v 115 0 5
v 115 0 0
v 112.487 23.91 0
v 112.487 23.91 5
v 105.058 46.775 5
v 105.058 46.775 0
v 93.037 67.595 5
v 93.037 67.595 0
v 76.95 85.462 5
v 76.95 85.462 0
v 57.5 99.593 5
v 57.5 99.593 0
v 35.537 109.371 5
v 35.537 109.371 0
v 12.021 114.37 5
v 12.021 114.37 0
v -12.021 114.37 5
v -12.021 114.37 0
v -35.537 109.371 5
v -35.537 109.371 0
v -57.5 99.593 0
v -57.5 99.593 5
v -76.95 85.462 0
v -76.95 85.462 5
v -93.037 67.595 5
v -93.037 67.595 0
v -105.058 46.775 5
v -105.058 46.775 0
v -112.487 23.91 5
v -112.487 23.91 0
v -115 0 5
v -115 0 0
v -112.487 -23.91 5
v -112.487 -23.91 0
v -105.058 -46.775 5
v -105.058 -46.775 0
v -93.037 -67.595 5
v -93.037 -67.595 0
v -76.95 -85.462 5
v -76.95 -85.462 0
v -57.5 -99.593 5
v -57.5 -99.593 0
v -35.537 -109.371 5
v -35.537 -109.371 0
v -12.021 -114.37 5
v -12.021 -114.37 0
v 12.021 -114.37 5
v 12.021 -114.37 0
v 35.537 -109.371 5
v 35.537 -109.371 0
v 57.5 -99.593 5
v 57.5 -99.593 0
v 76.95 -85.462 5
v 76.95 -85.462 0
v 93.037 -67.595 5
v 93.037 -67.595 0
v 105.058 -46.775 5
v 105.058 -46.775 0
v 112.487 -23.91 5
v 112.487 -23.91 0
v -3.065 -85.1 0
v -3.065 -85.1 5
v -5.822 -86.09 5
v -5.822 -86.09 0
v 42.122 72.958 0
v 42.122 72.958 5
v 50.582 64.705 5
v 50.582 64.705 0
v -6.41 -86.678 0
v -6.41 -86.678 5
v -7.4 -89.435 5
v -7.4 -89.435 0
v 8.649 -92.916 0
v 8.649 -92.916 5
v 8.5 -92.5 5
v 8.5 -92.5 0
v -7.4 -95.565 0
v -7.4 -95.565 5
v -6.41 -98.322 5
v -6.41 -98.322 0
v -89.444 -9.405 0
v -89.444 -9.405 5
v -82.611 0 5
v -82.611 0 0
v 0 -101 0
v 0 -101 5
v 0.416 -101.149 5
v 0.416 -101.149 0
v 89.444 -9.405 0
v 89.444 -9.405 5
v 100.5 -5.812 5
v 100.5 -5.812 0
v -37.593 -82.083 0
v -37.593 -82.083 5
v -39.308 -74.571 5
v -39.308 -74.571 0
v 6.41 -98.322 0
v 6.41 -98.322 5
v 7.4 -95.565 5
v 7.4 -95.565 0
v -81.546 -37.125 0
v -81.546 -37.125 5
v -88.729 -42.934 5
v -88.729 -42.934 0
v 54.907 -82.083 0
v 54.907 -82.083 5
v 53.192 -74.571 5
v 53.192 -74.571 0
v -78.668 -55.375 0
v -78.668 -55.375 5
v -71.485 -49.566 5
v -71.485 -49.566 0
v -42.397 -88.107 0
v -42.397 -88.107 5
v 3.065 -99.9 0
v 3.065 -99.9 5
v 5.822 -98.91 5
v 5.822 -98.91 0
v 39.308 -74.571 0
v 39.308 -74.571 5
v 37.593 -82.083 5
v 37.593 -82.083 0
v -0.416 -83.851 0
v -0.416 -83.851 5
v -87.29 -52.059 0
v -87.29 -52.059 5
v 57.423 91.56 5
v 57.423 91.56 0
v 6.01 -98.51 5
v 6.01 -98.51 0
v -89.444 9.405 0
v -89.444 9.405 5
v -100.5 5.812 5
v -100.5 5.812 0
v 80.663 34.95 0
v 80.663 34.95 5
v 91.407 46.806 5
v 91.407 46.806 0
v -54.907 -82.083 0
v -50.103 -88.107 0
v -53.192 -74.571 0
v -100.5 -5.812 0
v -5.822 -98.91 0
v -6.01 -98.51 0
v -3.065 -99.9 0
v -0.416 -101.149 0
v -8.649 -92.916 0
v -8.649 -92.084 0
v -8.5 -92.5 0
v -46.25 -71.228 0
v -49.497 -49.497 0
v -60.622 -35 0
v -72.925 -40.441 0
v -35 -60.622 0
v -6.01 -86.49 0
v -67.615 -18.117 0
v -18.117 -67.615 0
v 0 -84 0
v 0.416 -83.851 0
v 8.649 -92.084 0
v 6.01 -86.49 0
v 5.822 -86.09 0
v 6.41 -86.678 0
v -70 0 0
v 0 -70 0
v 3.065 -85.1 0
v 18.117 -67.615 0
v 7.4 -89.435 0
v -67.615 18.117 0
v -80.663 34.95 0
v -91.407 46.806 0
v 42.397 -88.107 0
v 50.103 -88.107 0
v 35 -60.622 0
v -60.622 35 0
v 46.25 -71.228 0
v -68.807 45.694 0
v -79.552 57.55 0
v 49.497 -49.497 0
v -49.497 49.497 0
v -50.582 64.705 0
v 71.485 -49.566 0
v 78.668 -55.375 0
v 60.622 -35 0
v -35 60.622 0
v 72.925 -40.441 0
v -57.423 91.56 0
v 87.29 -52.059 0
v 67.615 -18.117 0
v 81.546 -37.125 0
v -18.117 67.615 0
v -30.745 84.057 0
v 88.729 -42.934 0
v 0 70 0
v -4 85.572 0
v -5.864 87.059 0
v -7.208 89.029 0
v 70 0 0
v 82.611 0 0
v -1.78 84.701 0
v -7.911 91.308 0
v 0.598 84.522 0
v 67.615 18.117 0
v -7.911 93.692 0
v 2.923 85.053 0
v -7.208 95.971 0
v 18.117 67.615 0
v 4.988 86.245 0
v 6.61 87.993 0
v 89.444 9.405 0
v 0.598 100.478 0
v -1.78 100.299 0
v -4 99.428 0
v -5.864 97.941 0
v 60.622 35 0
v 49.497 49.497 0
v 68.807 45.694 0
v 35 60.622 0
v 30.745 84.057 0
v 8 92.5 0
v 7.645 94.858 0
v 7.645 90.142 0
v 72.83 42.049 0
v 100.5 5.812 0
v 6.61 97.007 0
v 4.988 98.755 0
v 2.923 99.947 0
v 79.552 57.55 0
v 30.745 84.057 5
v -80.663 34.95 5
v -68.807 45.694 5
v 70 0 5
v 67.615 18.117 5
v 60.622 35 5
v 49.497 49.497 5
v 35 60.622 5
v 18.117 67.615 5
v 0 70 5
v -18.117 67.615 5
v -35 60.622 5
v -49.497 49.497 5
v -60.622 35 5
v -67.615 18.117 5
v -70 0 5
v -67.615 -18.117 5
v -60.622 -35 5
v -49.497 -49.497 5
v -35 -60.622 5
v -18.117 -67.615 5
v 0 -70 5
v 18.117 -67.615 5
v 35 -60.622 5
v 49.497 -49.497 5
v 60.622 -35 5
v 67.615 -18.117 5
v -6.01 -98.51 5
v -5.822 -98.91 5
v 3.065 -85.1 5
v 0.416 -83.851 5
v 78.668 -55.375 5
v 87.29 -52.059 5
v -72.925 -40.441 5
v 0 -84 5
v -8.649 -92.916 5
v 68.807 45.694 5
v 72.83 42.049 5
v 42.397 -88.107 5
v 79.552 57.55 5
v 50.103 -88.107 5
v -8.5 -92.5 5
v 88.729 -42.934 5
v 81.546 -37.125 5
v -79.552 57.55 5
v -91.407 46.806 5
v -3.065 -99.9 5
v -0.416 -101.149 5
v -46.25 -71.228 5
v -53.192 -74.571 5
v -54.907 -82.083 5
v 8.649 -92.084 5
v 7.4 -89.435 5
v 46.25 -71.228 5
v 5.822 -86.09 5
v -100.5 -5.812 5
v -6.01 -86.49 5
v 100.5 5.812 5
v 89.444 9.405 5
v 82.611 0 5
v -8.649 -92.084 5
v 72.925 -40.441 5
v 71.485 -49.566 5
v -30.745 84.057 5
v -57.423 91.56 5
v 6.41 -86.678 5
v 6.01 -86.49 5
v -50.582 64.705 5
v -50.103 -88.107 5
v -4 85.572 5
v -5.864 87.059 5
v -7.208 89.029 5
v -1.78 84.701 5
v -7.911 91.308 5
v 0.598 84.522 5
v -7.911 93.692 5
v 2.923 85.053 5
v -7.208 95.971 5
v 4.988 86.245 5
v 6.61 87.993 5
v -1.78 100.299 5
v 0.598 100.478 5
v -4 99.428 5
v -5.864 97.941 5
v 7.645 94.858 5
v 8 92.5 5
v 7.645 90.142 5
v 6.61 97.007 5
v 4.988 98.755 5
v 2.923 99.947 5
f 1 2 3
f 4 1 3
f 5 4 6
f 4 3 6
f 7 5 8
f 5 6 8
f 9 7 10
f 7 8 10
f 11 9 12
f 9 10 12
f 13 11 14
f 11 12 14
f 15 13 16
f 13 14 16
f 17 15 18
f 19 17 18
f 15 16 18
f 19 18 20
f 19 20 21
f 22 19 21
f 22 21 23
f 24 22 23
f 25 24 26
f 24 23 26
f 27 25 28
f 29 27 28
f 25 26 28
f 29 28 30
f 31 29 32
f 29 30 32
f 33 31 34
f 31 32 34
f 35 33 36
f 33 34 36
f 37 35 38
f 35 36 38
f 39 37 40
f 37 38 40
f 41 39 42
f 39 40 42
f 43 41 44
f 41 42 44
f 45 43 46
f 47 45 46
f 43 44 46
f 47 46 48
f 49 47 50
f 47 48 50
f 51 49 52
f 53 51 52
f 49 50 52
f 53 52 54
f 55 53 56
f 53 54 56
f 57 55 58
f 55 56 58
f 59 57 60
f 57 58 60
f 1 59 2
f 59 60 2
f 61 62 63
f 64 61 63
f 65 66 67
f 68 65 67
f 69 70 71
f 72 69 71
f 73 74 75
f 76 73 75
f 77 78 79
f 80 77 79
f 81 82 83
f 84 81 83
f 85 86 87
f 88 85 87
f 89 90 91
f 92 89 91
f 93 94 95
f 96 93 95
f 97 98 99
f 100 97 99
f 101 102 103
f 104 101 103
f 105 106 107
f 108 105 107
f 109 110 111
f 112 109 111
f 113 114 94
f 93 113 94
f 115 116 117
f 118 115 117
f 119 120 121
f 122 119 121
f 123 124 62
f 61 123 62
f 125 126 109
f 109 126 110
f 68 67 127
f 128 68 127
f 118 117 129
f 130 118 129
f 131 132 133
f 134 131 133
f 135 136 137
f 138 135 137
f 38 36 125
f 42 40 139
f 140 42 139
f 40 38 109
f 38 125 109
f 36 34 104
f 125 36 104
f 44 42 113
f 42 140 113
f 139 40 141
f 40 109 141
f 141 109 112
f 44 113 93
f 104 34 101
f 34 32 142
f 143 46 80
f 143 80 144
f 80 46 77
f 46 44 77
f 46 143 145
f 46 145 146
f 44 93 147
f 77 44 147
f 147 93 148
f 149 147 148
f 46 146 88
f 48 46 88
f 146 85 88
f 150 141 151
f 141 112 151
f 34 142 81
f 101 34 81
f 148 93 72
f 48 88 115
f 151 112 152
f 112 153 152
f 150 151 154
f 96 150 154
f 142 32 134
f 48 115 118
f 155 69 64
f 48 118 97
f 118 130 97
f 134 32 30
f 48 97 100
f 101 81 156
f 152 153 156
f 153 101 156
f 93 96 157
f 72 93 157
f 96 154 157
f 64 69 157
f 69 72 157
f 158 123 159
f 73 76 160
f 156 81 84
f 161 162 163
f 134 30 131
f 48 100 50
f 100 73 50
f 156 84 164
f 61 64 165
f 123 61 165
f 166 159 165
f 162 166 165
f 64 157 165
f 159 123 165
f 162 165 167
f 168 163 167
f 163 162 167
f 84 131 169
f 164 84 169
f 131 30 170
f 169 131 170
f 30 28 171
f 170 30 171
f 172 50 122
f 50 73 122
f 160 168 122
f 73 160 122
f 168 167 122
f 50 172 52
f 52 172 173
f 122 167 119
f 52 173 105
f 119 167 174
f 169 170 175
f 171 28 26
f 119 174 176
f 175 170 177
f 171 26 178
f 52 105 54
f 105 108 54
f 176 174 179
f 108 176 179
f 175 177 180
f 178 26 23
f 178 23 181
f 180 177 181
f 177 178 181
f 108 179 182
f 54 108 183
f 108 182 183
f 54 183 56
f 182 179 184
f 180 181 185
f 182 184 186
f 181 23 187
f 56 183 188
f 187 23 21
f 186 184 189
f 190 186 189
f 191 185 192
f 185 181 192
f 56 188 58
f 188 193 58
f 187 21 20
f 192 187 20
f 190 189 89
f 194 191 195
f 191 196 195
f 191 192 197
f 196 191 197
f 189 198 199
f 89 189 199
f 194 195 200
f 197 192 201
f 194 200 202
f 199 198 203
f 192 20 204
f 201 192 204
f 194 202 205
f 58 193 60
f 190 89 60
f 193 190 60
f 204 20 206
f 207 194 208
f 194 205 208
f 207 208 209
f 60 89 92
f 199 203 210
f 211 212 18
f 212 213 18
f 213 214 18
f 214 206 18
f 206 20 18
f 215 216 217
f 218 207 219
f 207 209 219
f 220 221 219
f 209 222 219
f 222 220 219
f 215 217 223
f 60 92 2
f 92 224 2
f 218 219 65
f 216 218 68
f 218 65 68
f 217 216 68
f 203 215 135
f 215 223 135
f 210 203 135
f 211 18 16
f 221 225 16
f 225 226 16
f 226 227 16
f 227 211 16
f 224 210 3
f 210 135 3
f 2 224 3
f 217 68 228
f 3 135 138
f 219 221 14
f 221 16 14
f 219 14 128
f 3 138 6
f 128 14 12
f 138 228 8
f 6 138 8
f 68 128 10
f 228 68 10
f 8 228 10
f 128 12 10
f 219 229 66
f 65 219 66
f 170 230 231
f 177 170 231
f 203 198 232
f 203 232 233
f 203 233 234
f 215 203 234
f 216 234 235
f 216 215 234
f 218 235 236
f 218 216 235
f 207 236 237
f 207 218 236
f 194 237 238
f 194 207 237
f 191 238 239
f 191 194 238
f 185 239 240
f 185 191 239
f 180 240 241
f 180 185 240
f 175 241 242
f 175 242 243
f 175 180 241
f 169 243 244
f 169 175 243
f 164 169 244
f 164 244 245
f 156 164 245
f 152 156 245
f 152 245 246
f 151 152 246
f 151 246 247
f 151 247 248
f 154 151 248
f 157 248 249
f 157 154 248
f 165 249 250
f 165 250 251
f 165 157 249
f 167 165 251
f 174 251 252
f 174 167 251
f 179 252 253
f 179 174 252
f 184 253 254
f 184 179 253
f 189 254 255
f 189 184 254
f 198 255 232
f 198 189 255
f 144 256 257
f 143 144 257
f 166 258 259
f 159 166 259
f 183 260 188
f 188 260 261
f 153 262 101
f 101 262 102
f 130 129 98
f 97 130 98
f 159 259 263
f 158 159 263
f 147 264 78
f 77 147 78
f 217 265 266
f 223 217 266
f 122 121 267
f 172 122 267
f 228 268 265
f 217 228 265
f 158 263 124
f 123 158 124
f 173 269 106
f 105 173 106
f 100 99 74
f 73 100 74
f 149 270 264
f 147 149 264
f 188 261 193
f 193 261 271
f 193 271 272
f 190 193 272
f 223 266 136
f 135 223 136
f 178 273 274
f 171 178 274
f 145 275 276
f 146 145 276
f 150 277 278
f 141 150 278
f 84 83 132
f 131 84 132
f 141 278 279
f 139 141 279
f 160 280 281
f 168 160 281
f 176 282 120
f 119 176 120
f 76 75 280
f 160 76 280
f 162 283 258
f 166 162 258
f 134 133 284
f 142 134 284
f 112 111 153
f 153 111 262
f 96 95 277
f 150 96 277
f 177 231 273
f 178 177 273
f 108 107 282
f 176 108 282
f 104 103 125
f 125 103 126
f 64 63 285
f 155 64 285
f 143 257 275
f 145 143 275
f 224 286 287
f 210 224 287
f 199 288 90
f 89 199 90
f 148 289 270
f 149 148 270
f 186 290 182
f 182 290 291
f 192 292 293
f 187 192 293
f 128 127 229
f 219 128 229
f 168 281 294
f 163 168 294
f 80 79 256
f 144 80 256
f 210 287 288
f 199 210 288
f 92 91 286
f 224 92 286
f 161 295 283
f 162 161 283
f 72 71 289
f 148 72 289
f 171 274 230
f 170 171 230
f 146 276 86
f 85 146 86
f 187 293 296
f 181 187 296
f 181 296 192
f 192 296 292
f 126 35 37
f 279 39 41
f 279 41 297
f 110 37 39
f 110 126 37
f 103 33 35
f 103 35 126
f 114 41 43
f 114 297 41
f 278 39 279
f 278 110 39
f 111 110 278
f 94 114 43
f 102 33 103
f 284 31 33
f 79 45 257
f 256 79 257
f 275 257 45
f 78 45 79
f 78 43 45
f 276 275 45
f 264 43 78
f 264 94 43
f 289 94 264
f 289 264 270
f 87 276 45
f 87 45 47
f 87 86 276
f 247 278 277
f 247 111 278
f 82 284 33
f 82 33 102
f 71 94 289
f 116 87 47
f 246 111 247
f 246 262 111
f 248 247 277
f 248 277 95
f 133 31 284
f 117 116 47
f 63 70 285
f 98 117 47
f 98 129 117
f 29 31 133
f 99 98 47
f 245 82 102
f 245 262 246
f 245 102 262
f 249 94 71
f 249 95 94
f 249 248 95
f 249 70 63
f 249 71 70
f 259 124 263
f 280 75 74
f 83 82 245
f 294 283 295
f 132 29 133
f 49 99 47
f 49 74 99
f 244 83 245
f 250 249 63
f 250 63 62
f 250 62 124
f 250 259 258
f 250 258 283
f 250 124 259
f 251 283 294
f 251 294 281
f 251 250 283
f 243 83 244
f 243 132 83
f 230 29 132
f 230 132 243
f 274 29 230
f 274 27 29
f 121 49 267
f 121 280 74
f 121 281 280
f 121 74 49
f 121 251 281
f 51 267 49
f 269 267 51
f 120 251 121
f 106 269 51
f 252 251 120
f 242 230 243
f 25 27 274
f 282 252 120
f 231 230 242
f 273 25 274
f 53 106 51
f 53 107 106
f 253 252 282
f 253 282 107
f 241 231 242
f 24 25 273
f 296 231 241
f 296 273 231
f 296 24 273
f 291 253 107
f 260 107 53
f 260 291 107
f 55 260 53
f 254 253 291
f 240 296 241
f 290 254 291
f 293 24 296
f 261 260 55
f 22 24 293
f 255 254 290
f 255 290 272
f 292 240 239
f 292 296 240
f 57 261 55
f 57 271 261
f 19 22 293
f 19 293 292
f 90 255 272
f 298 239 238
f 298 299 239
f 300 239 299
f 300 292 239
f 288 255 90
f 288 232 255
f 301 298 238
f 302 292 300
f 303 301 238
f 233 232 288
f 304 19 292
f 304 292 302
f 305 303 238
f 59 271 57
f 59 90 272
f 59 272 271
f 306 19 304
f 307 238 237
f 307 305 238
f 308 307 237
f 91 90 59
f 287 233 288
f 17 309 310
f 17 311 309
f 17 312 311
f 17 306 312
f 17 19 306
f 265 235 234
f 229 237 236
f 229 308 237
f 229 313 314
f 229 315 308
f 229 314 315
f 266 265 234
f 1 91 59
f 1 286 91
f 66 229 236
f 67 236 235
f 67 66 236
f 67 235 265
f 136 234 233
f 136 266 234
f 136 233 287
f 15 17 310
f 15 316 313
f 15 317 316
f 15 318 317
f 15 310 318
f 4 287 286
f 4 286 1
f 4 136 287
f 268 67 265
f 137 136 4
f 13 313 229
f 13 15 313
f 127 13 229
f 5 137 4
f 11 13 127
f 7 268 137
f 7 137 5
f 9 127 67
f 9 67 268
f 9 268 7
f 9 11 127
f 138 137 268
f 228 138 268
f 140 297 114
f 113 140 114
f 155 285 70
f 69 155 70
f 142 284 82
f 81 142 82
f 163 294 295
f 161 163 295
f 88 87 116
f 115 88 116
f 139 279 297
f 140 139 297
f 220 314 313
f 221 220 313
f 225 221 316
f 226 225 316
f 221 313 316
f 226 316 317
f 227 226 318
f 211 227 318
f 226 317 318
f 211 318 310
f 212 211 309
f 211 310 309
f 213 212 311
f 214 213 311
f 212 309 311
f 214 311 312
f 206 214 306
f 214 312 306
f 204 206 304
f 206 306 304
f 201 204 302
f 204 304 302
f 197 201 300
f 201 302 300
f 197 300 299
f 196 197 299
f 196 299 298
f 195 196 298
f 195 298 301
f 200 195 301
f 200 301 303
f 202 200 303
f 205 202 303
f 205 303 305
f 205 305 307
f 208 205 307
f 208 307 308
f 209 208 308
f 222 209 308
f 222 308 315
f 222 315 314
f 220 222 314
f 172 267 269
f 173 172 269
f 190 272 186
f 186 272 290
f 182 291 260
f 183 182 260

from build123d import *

# Parameters (mm, degrees)
F0_R     = 115
F0_R_2   = 70
F1_DEPTH = 5
F2_R     = 8
F3_DEPTH = 25


with BuildPart() as f1:
    # F0 (on Top) → F1 (new body)
    with BuildSketch(Plane.XY):
        Circle(F0_R)
        Circle(F0_R_2, mode=Mode.SUBTRACT)
    extrude(amount=F1_DEPTH)

    # F2 (on face) → F3 (cut)
    with BuildSketch(Plane.XY.offset(5)):
        with Locations((0, 92.5)):
            Circle(F2_R)
        Polygon((30.7451541874, 84.0570025344), (42.1222582105, 72.9578913502), (50.5819233456, 64.7049331524), (57.422922467, 91.5601138634), align=None)
        Polygon((68.8072985361, 45.6942659799), (72.8301810847, 42.0485246544), (80.6630838702, 34.949948686), (91.4074011641, 46.8057340201), (79.55161583, 57.550051314), align=None)
        Polygon((100.5, -5.812340224), (100.5, 5.812340224), (89.44427191, 9.4045640367), (82.61145618, 0), (89.44427191, -9.4045640367), align=None)
        Polygon((78.6682453406, -55.374818439), (87.2901221684, -52.0587102834), (88.7292266779, -42.9338918444), (81.5464543596, -37.125181561), (72.9245775317, -40.4412897166), (71.4854730222, -49.5661081556), align=None)
        Polygon((42.3974030495, -88.1073498501), (50.1025969505, -88.1073498501), (54.906706769, -82.0831866798), (53.1921398259, -74.571178077), (46.25, -71.2280197367), (39.3078601741, -74.571178077), (37.593293231, -82.0831866798), align=None)
        Polygon((3.065005288, -99.899577335), (5.8217626423, -98.9099722116), (6.010291359, -98.510291359), align=None)
        Polygon((0.4159269752, -101.1491426608), (3.065005288, -99.899577335), (0, -100.9998355537), align=None)
        Polygon((0, -100.9998355537), (3.065005288, -99.899577335), (6.010291359, -98.510291359), (7.399577335, -95.565005288), (8.4998355537, -92.5), (7.399577335, -89.434994712), (6.010291359, -86.489708641), (3.065005288, -85.100422665), (0, -84.0001644463), (-3.065005288, -85.100422665), (-6.010291359, -86.489708641), (-7.399577335, -89.434994712), (-8.4998355537, -92.5), (-7.399577335, -95.565005288), (-6.010291359, -98.510291359), (-3.065005288, -99.899577335), align=None)
        Polygon((7.399577335, -95.565005288), (6.010291359, -98.510291359), (6.4099722116, -98.3217626423), align=None)
        Polygon((-0.4159269752, -101.1491426608), (0, -100.9998355537), (-3.065005288, -99.899577335), align=None)
        Polygon((8.4998355537, -92.5), (7.399577335, -95.565005288), (8.6491426608, -92.9159269752), align=None)
        Polygon((-5.8217626423, -98.9099722116), (-3.065005288, -99.899577335), (-6.010291359, -98.510291359), align=None)
        Polygon((7.399577335, -89.434994712), (8.4998355537, -92.5), (8.6491426608, -92.0840730248), align=None)
        Polygon((-6.4099722116, -98.3217626423), (-6.010291359, -98.510291359), (-7.399577335, -95.565005288), align=None)
        Polygon((6.010291359, -86.489708641), (7.399577335, -89.434994712), (6.4099722116, -86.6782373577), align=None)
        Polygon((-8.6491426608, -92.9159269752), (-7.399577335, -95.565005288), (-8.4998355537, -92.5), align=None)
        Polygon((3.065005288, -85.100422665), (6.010291359, -86.489708641), (5.8217626423, -86.0900277884), align=None)
        Polygon((-8.6491426608, -92.0840730248), (-8.4998355537, -92.5), (-7.399577335, -89.434994712), align=None)
        Polygon((0, -84.0001644463), (3.065005288, -85.100422665), (0.4159269752, -83.8508573392), align=None)
        Polygon((-6.4099722116, -86.6782373577), (-7.399577335, -89.434994712), (-6.010291359, -86.489708641), align=None)
        Polygon((-3.065005288, -85.100422665), (0, -84.0001644463), (-0.4159269752, -83.8508573392), align=None)
        Polygon((-5.8217626423, -86.0900277884), (-6.010291359, -86.489708641), (-3.065005288, -85.100422665), align=None)
        Polygon((-57.422922467, 91.5601138634), (-50.5819233456, 64.7049331524), (-30.7451541874, 84.0570025344), align=None)
        Polygon((-80.6630838702, 34.949948686), (-68.8072985361, 45.6942659799), (-79.55161583, 57.550051314), (-91.4074011641, 46.8057340201), align=None)
        Polygon((-100.5, -5.812340224), (-89.44427191, -9.4045640367), (-82.61145618, 0), (-89.44427191, 9.4045640367), (-100.5, 5.812340224), align=None)
        Polygon((-71.4854730222, -49.5661081556), (-72.9245775317, -40.4412897166), (-81.5464543596, -37.125181561), (-88.7292266779, -42.9338918444), (-87.2901221684, -52.0587102834), (-78.6682453406, -55.374818439), align=None)
        Polygon((-50.1025969505, -88.1073498501), (-42.3974030495, -88.1073498501), (-37.593293231, -82.0831866798), (-39.3078601741, -74.571178077), (-46.25, -71.2280197367), (-53.1921398259, -74.571178077), (-54.906706769, -82.0831866798), align=None)
    extrude(amount=-F3_DEPTH, mode=Mode.SUBTRACT)


solid = f1.part
